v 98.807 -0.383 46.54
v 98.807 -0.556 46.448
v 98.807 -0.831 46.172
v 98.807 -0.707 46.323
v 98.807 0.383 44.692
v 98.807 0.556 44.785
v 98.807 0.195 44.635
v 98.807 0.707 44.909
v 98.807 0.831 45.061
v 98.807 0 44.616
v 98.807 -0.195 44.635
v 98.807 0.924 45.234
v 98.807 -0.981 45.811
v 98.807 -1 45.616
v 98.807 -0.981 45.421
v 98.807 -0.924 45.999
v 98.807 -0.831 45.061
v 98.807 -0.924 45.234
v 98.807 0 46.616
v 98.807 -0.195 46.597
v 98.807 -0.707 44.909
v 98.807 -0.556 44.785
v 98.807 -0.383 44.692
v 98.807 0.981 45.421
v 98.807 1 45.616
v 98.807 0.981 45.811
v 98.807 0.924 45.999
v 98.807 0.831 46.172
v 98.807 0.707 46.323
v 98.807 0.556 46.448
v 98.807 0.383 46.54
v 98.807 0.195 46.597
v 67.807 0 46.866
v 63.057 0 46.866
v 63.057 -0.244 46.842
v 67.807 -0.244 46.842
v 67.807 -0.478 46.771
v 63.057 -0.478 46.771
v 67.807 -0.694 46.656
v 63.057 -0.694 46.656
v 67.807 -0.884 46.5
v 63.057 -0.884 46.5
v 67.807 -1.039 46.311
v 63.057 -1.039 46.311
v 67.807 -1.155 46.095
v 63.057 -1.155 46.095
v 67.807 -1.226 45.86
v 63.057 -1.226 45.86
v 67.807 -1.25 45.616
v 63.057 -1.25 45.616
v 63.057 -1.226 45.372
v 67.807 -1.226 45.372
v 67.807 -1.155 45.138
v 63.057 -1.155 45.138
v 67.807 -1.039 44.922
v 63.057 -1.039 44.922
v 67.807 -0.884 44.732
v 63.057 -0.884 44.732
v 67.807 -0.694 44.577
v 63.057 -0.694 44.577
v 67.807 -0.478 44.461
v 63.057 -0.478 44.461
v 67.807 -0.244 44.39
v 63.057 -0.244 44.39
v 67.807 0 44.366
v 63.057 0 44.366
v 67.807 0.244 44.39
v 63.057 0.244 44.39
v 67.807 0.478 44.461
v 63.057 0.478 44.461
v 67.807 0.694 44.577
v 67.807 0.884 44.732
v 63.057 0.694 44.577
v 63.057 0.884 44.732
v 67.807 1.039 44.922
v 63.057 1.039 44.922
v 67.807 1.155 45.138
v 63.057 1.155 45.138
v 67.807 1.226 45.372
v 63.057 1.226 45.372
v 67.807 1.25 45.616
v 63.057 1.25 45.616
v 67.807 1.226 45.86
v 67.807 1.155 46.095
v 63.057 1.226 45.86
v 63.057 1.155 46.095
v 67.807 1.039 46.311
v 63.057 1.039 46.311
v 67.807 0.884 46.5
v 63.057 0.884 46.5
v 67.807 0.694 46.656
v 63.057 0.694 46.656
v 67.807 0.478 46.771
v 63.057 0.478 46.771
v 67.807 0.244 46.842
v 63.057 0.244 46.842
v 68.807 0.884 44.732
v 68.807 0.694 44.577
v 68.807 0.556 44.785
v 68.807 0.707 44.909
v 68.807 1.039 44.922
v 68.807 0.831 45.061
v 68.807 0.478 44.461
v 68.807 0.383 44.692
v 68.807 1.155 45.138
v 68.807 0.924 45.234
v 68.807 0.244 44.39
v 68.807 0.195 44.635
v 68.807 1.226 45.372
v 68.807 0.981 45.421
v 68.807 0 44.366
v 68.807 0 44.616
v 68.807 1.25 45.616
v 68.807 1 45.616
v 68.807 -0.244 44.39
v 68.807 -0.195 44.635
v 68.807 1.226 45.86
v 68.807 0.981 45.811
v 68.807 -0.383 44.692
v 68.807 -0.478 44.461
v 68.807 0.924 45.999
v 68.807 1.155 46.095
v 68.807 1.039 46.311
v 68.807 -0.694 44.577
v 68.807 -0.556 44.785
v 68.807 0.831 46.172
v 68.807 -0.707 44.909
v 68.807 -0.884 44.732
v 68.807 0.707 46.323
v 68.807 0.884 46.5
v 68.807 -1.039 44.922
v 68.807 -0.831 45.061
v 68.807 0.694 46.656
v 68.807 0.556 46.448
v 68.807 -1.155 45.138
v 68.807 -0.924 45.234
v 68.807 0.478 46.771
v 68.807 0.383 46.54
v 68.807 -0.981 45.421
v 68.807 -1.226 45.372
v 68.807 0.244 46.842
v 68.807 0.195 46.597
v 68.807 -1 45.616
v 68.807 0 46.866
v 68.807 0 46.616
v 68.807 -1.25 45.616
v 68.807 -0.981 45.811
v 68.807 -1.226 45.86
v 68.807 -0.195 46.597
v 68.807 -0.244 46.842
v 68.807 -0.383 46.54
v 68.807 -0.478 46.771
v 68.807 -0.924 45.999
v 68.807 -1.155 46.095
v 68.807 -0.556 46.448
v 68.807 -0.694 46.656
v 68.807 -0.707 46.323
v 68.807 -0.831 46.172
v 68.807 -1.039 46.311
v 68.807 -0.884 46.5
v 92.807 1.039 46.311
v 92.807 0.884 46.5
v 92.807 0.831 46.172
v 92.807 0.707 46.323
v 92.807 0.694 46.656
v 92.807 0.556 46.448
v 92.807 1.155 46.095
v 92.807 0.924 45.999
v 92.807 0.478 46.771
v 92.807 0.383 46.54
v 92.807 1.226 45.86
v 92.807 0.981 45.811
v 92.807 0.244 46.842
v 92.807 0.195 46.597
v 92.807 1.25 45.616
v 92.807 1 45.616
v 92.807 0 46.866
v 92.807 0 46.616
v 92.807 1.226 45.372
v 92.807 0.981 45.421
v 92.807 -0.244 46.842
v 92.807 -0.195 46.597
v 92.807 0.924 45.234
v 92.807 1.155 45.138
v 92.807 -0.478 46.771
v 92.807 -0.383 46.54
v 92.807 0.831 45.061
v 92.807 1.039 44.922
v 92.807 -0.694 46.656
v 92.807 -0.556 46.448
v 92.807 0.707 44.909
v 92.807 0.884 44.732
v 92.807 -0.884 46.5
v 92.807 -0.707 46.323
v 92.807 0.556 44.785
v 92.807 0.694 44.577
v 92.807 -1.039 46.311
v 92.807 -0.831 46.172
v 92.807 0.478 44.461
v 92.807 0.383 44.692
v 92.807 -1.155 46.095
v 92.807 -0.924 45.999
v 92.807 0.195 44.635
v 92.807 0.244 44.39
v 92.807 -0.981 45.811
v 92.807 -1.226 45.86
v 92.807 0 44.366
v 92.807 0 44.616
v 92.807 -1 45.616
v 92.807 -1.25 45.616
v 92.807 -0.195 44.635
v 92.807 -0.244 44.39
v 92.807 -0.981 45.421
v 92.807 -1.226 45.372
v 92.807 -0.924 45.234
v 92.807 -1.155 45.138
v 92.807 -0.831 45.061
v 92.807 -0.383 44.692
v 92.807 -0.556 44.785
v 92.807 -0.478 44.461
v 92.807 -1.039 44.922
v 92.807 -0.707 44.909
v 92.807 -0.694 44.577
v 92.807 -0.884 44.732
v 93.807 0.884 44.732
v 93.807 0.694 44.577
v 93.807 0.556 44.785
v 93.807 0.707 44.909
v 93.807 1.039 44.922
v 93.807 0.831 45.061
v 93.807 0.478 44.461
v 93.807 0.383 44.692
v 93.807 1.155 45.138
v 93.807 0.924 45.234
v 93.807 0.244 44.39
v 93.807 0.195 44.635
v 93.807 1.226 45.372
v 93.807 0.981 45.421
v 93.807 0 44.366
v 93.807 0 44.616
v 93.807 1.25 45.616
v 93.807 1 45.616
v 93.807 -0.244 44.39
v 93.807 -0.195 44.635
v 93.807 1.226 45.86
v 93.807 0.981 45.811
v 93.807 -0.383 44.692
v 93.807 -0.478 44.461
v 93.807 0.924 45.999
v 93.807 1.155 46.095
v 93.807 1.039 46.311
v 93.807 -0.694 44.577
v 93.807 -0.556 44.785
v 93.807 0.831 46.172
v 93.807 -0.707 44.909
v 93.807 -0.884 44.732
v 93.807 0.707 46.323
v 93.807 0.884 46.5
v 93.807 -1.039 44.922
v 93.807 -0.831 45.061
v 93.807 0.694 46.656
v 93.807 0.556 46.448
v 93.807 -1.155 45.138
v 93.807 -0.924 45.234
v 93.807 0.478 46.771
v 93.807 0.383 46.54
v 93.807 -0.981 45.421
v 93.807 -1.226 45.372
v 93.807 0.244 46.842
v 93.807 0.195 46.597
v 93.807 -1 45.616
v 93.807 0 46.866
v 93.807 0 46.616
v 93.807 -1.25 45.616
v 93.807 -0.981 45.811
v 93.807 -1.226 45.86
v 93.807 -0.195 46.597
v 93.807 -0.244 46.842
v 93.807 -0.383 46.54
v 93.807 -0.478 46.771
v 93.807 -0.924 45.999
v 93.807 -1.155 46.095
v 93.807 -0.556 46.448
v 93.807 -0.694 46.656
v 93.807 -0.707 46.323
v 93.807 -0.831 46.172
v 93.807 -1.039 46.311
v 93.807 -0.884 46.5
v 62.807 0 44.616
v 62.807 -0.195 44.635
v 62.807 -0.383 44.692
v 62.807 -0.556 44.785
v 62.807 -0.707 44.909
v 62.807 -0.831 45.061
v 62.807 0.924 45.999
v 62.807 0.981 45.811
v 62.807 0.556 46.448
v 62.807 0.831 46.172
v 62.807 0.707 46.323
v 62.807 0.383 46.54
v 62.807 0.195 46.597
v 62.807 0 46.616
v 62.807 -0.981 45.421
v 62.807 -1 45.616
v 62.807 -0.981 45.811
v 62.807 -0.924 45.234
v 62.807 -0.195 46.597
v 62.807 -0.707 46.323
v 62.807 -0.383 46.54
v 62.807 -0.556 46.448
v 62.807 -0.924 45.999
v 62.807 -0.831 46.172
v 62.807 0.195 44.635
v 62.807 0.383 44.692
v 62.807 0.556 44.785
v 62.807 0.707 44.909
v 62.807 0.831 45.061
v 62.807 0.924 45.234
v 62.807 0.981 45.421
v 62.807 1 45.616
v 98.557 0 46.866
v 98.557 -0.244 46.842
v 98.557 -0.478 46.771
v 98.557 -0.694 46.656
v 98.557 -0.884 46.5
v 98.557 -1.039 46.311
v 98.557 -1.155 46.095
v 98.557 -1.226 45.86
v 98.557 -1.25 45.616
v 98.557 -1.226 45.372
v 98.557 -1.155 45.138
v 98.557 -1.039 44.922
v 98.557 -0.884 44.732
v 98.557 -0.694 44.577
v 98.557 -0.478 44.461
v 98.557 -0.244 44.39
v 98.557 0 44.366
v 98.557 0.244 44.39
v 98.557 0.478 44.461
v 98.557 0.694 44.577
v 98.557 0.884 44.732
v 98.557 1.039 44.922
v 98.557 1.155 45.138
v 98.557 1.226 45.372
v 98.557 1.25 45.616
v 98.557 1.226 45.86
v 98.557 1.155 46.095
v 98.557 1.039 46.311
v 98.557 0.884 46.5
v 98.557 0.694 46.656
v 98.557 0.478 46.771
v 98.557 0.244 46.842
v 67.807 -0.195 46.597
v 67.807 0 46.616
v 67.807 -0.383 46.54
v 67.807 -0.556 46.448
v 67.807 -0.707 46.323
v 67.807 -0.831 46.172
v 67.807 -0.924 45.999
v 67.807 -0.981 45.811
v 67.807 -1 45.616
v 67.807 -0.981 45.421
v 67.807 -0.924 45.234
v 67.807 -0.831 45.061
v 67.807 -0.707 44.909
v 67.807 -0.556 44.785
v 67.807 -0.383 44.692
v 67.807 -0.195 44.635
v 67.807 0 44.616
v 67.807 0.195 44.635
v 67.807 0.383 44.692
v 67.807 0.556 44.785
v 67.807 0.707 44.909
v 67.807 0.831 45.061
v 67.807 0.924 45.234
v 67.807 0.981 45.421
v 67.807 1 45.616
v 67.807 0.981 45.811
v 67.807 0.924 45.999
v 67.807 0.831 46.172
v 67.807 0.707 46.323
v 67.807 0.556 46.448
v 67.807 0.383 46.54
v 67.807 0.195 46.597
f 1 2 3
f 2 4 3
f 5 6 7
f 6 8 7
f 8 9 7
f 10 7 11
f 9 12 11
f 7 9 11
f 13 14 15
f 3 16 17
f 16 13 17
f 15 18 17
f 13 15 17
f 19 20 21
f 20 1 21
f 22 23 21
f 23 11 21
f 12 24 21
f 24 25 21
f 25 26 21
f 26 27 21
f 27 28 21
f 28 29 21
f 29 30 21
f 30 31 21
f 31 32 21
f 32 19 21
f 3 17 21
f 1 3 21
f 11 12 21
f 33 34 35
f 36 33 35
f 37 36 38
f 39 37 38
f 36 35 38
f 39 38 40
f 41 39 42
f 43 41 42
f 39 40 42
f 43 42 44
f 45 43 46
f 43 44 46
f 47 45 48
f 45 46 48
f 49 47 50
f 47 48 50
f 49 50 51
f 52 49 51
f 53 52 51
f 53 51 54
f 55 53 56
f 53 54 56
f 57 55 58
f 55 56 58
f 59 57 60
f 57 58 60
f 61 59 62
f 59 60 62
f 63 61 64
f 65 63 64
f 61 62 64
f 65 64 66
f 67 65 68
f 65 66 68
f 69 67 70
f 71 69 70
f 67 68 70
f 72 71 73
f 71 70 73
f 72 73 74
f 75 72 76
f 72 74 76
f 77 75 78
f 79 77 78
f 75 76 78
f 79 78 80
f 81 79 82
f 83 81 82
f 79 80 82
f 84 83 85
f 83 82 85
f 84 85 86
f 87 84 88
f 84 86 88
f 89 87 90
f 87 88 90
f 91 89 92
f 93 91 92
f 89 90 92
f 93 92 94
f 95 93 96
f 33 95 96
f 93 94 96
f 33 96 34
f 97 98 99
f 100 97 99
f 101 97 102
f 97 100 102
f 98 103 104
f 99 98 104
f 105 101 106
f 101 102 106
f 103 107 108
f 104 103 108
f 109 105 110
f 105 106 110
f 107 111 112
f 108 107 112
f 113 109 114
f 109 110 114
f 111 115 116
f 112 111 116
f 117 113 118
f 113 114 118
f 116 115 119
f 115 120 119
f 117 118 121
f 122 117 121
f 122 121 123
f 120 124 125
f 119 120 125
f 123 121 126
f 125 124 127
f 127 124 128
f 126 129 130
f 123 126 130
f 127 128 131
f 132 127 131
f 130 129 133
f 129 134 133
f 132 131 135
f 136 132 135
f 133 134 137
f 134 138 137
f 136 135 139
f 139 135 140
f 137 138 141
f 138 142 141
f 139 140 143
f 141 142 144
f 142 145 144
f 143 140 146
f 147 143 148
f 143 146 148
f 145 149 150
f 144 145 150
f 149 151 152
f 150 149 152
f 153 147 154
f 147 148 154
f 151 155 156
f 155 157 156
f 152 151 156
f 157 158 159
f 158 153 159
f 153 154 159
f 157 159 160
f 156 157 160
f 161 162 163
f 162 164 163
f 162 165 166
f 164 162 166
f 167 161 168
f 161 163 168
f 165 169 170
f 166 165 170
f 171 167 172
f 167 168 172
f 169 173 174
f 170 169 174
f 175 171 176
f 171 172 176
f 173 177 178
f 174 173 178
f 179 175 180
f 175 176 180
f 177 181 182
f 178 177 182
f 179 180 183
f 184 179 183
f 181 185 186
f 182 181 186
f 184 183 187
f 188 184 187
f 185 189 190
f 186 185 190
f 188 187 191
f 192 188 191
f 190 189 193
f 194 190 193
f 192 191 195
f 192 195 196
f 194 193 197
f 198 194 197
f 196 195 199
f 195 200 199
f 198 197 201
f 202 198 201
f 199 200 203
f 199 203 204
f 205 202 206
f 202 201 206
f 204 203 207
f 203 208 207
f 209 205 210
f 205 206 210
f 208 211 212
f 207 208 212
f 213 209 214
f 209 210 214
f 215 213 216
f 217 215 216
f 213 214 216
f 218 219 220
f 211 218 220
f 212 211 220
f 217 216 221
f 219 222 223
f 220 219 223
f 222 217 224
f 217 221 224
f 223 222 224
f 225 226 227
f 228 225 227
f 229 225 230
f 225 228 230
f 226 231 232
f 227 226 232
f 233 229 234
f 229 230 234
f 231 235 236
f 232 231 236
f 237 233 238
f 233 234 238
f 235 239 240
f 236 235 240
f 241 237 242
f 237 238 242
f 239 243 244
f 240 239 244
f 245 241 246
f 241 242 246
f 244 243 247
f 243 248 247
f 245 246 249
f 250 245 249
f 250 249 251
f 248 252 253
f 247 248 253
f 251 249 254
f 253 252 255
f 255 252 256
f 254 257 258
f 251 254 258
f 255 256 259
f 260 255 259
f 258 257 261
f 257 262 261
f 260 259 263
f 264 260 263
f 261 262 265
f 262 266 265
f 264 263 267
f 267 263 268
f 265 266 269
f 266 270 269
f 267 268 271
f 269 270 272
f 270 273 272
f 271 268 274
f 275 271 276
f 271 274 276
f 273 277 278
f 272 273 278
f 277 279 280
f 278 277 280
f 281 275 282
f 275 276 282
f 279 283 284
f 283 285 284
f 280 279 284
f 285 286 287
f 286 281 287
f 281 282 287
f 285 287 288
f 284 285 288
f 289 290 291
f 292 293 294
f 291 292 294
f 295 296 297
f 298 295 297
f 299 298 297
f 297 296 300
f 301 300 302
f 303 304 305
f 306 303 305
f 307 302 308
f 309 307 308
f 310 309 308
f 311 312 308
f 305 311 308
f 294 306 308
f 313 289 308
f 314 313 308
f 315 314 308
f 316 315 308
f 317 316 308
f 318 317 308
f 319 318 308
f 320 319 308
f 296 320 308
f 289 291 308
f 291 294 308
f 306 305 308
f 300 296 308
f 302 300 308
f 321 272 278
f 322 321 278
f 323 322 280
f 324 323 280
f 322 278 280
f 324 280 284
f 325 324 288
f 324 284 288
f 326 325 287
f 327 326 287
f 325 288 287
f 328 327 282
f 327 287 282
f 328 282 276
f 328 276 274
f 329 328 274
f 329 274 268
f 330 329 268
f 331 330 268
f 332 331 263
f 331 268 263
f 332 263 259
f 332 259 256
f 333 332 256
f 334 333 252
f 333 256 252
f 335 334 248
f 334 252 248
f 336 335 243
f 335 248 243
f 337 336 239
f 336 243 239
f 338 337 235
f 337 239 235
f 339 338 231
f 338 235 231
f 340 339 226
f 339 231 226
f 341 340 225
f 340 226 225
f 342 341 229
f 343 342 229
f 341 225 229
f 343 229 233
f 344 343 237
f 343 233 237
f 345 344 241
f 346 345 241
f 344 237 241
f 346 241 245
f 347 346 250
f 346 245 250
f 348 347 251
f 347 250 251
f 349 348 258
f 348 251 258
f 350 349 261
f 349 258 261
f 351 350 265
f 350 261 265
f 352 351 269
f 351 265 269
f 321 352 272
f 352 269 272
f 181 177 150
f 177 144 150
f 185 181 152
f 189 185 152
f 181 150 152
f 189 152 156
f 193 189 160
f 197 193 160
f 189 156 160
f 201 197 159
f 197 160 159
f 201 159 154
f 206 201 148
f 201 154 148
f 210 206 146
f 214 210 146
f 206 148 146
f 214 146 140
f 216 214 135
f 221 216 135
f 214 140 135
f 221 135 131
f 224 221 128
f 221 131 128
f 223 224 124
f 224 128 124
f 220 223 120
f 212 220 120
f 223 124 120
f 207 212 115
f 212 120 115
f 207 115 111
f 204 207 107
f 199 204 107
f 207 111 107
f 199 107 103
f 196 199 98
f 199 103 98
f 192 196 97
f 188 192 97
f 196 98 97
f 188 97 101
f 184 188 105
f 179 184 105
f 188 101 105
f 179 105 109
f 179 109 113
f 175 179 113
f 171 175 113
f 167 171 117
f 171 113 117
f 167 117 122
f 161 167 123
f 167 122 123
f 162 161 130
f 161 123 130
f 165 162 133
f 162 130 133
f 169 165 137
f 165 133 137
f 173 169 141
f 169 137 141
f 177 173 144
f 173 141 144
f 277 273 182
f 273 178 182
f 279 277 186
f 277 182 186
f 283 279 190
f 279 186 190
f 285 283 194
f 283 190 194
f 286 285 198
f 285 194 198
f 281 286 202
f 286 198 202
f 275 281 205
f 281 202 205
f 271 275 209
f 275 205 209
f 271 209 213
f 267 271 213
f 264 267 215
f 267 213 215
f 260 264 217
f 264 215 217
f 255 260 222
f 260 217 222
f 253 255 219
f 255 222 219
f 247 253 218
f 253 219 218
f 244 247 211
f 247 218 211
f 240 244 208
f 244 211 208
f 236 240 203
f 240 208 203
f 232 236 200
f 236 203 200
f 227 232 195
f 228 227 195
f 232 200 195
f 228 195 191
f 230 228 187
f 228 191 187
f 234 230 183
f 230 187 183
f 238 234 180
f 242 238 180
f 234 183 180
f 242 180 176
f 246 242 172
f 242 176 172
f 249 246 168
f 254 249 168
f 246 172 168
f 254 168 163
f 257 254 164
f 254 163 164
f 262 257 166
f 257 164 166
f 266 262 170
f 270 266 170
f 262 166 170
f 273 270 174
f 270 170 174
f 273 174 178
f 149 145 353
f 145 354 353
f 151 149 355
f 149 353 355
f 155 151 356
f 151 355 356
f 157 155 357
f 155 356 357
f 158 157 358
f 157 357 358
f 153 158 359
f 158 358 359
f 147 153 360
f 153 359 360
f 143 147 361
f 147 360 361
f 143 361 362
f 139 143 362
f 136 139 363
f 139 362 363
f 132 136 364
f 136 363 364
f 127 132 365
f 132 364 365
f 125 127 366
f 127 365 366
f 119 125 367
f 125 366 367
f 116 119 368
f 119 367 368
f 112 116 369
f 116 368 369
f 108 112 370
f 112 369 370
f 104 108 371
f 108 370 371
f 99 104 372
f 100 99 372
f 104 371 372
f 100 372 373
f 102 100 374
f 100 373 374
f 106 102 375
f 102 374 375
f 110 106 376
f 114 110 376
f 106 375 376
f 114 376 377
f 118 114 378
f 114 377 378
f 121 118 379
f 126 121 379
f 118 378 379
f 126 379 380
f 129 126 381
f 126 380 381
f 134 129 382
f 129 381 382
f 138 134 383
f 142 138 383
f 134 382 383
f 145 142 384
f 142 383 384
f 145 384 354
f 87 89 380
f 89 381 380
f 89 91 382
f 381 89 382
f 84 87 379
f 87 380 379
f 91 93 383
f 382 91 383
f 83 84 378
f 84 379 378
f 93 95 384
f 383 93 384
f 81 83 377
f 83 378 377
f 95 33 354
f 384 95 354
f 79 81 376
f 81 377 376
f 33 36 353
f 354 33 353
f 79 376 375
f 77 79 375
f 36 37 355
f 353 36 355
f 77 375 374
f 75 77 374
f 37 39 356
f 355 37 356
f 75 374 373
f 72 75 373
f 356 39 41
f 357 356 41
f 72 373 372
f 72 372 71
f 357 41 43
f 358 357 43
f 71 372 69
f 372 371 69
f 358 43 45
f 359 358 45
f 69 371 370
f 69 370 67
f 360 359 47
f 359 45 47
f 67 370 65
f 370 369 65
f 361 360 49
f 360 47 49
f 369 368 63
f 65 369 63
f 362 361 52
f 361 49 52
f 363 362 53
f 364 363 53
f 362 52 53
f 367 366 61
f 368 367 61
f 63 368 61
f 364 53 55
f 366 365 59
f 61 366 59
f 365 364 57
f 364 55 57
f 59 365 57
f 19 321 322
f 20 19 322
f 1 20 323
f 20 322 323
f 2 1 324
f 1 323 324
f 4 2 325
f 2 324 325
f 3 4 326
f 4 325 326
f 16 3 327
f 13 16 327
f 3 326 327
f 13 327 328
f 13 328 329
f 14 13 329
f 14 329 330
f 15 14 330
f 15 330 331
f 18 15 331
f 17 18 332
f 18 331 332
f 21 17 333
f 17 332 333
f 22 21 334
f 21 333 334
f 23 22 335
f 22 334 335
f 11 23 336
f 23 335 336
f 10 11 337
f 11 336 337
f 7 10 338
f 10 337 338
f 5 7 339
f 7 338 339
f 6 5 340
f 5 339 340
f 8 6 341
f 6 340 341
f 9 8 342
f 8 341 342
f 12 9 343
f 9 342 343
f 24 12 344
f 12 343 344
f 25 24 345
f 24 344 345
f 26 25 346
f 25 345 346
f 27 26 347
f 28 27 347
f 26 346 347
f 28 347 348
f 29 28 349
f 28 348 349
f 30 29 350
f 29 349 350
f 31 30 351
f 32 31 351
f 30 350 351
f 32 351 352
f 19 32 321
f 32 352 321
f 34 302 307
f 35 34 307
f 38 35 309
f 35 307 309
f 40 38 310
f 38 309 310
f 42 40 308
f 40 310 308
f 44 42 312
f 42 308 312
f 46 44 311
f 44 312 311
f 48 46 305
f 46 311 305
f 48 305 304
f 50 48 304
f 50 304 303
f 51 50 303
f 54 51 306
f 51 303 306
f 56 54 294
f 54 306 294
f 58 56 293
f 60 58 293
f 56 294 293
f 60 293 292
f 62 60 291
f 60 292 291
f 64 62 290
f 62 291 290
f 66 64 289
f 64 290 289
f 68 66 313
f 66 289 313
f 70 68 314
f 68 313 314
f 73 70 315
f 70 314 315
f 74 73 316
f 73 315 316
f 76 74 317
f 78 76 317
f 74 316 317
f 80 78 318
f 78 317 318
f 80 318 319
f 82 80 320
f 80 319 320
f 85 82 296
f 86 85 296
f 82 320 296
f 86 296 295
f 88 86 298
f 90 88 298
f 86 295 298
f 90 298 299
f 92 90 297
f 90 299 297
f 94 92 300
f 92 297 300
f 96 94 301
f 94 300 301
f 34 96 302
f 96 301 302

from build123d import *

# Parameters (mm, degrees)
F2_SIZE = 0.25


with BuildPart() as f1:
    # F0 (on Front) → F1 (revolve)
    with BuildSketch(Plane.XZ):
        Polygon((80.8070451021, 45.6162330286), (98.8070451021, 45.6162330286), (98.8070451021, 46.8662330286), (93.8070451021, 46.8662330286), (93.8070451021, 46.6162330286), (92.8070451021, 46.6162330286), (92.8070451021, 46.8662330286), (80.8070451021, 46.8662330286), align=None)
        Polygon((62.8070451021, 45.6162330286), (80.8070451021, 45.6162330286), (80.8070451021, 46.8662330286), (68.8070451021, 46.8662330286), (68.8070451021, 46.6162330286), (67.8070451021, 46.6162330286), (67.8070451021, 46.8662330286), (62.8070451021, 46.8662330286), align=None)
    revolve(axis=Axis((89.8070451021, 0, 45.6162330286), (1, 0, 0)))

    # F2
    f2_edges = [f1.edges().sort_by_distance(p)[0] for p in [
        (98.807045, 0, 44.366233),
        (62.807045, 0, 44.366233),
    ]]
    chamfer(f2_edges, length=F2_SIZE)


solid = f1.part
